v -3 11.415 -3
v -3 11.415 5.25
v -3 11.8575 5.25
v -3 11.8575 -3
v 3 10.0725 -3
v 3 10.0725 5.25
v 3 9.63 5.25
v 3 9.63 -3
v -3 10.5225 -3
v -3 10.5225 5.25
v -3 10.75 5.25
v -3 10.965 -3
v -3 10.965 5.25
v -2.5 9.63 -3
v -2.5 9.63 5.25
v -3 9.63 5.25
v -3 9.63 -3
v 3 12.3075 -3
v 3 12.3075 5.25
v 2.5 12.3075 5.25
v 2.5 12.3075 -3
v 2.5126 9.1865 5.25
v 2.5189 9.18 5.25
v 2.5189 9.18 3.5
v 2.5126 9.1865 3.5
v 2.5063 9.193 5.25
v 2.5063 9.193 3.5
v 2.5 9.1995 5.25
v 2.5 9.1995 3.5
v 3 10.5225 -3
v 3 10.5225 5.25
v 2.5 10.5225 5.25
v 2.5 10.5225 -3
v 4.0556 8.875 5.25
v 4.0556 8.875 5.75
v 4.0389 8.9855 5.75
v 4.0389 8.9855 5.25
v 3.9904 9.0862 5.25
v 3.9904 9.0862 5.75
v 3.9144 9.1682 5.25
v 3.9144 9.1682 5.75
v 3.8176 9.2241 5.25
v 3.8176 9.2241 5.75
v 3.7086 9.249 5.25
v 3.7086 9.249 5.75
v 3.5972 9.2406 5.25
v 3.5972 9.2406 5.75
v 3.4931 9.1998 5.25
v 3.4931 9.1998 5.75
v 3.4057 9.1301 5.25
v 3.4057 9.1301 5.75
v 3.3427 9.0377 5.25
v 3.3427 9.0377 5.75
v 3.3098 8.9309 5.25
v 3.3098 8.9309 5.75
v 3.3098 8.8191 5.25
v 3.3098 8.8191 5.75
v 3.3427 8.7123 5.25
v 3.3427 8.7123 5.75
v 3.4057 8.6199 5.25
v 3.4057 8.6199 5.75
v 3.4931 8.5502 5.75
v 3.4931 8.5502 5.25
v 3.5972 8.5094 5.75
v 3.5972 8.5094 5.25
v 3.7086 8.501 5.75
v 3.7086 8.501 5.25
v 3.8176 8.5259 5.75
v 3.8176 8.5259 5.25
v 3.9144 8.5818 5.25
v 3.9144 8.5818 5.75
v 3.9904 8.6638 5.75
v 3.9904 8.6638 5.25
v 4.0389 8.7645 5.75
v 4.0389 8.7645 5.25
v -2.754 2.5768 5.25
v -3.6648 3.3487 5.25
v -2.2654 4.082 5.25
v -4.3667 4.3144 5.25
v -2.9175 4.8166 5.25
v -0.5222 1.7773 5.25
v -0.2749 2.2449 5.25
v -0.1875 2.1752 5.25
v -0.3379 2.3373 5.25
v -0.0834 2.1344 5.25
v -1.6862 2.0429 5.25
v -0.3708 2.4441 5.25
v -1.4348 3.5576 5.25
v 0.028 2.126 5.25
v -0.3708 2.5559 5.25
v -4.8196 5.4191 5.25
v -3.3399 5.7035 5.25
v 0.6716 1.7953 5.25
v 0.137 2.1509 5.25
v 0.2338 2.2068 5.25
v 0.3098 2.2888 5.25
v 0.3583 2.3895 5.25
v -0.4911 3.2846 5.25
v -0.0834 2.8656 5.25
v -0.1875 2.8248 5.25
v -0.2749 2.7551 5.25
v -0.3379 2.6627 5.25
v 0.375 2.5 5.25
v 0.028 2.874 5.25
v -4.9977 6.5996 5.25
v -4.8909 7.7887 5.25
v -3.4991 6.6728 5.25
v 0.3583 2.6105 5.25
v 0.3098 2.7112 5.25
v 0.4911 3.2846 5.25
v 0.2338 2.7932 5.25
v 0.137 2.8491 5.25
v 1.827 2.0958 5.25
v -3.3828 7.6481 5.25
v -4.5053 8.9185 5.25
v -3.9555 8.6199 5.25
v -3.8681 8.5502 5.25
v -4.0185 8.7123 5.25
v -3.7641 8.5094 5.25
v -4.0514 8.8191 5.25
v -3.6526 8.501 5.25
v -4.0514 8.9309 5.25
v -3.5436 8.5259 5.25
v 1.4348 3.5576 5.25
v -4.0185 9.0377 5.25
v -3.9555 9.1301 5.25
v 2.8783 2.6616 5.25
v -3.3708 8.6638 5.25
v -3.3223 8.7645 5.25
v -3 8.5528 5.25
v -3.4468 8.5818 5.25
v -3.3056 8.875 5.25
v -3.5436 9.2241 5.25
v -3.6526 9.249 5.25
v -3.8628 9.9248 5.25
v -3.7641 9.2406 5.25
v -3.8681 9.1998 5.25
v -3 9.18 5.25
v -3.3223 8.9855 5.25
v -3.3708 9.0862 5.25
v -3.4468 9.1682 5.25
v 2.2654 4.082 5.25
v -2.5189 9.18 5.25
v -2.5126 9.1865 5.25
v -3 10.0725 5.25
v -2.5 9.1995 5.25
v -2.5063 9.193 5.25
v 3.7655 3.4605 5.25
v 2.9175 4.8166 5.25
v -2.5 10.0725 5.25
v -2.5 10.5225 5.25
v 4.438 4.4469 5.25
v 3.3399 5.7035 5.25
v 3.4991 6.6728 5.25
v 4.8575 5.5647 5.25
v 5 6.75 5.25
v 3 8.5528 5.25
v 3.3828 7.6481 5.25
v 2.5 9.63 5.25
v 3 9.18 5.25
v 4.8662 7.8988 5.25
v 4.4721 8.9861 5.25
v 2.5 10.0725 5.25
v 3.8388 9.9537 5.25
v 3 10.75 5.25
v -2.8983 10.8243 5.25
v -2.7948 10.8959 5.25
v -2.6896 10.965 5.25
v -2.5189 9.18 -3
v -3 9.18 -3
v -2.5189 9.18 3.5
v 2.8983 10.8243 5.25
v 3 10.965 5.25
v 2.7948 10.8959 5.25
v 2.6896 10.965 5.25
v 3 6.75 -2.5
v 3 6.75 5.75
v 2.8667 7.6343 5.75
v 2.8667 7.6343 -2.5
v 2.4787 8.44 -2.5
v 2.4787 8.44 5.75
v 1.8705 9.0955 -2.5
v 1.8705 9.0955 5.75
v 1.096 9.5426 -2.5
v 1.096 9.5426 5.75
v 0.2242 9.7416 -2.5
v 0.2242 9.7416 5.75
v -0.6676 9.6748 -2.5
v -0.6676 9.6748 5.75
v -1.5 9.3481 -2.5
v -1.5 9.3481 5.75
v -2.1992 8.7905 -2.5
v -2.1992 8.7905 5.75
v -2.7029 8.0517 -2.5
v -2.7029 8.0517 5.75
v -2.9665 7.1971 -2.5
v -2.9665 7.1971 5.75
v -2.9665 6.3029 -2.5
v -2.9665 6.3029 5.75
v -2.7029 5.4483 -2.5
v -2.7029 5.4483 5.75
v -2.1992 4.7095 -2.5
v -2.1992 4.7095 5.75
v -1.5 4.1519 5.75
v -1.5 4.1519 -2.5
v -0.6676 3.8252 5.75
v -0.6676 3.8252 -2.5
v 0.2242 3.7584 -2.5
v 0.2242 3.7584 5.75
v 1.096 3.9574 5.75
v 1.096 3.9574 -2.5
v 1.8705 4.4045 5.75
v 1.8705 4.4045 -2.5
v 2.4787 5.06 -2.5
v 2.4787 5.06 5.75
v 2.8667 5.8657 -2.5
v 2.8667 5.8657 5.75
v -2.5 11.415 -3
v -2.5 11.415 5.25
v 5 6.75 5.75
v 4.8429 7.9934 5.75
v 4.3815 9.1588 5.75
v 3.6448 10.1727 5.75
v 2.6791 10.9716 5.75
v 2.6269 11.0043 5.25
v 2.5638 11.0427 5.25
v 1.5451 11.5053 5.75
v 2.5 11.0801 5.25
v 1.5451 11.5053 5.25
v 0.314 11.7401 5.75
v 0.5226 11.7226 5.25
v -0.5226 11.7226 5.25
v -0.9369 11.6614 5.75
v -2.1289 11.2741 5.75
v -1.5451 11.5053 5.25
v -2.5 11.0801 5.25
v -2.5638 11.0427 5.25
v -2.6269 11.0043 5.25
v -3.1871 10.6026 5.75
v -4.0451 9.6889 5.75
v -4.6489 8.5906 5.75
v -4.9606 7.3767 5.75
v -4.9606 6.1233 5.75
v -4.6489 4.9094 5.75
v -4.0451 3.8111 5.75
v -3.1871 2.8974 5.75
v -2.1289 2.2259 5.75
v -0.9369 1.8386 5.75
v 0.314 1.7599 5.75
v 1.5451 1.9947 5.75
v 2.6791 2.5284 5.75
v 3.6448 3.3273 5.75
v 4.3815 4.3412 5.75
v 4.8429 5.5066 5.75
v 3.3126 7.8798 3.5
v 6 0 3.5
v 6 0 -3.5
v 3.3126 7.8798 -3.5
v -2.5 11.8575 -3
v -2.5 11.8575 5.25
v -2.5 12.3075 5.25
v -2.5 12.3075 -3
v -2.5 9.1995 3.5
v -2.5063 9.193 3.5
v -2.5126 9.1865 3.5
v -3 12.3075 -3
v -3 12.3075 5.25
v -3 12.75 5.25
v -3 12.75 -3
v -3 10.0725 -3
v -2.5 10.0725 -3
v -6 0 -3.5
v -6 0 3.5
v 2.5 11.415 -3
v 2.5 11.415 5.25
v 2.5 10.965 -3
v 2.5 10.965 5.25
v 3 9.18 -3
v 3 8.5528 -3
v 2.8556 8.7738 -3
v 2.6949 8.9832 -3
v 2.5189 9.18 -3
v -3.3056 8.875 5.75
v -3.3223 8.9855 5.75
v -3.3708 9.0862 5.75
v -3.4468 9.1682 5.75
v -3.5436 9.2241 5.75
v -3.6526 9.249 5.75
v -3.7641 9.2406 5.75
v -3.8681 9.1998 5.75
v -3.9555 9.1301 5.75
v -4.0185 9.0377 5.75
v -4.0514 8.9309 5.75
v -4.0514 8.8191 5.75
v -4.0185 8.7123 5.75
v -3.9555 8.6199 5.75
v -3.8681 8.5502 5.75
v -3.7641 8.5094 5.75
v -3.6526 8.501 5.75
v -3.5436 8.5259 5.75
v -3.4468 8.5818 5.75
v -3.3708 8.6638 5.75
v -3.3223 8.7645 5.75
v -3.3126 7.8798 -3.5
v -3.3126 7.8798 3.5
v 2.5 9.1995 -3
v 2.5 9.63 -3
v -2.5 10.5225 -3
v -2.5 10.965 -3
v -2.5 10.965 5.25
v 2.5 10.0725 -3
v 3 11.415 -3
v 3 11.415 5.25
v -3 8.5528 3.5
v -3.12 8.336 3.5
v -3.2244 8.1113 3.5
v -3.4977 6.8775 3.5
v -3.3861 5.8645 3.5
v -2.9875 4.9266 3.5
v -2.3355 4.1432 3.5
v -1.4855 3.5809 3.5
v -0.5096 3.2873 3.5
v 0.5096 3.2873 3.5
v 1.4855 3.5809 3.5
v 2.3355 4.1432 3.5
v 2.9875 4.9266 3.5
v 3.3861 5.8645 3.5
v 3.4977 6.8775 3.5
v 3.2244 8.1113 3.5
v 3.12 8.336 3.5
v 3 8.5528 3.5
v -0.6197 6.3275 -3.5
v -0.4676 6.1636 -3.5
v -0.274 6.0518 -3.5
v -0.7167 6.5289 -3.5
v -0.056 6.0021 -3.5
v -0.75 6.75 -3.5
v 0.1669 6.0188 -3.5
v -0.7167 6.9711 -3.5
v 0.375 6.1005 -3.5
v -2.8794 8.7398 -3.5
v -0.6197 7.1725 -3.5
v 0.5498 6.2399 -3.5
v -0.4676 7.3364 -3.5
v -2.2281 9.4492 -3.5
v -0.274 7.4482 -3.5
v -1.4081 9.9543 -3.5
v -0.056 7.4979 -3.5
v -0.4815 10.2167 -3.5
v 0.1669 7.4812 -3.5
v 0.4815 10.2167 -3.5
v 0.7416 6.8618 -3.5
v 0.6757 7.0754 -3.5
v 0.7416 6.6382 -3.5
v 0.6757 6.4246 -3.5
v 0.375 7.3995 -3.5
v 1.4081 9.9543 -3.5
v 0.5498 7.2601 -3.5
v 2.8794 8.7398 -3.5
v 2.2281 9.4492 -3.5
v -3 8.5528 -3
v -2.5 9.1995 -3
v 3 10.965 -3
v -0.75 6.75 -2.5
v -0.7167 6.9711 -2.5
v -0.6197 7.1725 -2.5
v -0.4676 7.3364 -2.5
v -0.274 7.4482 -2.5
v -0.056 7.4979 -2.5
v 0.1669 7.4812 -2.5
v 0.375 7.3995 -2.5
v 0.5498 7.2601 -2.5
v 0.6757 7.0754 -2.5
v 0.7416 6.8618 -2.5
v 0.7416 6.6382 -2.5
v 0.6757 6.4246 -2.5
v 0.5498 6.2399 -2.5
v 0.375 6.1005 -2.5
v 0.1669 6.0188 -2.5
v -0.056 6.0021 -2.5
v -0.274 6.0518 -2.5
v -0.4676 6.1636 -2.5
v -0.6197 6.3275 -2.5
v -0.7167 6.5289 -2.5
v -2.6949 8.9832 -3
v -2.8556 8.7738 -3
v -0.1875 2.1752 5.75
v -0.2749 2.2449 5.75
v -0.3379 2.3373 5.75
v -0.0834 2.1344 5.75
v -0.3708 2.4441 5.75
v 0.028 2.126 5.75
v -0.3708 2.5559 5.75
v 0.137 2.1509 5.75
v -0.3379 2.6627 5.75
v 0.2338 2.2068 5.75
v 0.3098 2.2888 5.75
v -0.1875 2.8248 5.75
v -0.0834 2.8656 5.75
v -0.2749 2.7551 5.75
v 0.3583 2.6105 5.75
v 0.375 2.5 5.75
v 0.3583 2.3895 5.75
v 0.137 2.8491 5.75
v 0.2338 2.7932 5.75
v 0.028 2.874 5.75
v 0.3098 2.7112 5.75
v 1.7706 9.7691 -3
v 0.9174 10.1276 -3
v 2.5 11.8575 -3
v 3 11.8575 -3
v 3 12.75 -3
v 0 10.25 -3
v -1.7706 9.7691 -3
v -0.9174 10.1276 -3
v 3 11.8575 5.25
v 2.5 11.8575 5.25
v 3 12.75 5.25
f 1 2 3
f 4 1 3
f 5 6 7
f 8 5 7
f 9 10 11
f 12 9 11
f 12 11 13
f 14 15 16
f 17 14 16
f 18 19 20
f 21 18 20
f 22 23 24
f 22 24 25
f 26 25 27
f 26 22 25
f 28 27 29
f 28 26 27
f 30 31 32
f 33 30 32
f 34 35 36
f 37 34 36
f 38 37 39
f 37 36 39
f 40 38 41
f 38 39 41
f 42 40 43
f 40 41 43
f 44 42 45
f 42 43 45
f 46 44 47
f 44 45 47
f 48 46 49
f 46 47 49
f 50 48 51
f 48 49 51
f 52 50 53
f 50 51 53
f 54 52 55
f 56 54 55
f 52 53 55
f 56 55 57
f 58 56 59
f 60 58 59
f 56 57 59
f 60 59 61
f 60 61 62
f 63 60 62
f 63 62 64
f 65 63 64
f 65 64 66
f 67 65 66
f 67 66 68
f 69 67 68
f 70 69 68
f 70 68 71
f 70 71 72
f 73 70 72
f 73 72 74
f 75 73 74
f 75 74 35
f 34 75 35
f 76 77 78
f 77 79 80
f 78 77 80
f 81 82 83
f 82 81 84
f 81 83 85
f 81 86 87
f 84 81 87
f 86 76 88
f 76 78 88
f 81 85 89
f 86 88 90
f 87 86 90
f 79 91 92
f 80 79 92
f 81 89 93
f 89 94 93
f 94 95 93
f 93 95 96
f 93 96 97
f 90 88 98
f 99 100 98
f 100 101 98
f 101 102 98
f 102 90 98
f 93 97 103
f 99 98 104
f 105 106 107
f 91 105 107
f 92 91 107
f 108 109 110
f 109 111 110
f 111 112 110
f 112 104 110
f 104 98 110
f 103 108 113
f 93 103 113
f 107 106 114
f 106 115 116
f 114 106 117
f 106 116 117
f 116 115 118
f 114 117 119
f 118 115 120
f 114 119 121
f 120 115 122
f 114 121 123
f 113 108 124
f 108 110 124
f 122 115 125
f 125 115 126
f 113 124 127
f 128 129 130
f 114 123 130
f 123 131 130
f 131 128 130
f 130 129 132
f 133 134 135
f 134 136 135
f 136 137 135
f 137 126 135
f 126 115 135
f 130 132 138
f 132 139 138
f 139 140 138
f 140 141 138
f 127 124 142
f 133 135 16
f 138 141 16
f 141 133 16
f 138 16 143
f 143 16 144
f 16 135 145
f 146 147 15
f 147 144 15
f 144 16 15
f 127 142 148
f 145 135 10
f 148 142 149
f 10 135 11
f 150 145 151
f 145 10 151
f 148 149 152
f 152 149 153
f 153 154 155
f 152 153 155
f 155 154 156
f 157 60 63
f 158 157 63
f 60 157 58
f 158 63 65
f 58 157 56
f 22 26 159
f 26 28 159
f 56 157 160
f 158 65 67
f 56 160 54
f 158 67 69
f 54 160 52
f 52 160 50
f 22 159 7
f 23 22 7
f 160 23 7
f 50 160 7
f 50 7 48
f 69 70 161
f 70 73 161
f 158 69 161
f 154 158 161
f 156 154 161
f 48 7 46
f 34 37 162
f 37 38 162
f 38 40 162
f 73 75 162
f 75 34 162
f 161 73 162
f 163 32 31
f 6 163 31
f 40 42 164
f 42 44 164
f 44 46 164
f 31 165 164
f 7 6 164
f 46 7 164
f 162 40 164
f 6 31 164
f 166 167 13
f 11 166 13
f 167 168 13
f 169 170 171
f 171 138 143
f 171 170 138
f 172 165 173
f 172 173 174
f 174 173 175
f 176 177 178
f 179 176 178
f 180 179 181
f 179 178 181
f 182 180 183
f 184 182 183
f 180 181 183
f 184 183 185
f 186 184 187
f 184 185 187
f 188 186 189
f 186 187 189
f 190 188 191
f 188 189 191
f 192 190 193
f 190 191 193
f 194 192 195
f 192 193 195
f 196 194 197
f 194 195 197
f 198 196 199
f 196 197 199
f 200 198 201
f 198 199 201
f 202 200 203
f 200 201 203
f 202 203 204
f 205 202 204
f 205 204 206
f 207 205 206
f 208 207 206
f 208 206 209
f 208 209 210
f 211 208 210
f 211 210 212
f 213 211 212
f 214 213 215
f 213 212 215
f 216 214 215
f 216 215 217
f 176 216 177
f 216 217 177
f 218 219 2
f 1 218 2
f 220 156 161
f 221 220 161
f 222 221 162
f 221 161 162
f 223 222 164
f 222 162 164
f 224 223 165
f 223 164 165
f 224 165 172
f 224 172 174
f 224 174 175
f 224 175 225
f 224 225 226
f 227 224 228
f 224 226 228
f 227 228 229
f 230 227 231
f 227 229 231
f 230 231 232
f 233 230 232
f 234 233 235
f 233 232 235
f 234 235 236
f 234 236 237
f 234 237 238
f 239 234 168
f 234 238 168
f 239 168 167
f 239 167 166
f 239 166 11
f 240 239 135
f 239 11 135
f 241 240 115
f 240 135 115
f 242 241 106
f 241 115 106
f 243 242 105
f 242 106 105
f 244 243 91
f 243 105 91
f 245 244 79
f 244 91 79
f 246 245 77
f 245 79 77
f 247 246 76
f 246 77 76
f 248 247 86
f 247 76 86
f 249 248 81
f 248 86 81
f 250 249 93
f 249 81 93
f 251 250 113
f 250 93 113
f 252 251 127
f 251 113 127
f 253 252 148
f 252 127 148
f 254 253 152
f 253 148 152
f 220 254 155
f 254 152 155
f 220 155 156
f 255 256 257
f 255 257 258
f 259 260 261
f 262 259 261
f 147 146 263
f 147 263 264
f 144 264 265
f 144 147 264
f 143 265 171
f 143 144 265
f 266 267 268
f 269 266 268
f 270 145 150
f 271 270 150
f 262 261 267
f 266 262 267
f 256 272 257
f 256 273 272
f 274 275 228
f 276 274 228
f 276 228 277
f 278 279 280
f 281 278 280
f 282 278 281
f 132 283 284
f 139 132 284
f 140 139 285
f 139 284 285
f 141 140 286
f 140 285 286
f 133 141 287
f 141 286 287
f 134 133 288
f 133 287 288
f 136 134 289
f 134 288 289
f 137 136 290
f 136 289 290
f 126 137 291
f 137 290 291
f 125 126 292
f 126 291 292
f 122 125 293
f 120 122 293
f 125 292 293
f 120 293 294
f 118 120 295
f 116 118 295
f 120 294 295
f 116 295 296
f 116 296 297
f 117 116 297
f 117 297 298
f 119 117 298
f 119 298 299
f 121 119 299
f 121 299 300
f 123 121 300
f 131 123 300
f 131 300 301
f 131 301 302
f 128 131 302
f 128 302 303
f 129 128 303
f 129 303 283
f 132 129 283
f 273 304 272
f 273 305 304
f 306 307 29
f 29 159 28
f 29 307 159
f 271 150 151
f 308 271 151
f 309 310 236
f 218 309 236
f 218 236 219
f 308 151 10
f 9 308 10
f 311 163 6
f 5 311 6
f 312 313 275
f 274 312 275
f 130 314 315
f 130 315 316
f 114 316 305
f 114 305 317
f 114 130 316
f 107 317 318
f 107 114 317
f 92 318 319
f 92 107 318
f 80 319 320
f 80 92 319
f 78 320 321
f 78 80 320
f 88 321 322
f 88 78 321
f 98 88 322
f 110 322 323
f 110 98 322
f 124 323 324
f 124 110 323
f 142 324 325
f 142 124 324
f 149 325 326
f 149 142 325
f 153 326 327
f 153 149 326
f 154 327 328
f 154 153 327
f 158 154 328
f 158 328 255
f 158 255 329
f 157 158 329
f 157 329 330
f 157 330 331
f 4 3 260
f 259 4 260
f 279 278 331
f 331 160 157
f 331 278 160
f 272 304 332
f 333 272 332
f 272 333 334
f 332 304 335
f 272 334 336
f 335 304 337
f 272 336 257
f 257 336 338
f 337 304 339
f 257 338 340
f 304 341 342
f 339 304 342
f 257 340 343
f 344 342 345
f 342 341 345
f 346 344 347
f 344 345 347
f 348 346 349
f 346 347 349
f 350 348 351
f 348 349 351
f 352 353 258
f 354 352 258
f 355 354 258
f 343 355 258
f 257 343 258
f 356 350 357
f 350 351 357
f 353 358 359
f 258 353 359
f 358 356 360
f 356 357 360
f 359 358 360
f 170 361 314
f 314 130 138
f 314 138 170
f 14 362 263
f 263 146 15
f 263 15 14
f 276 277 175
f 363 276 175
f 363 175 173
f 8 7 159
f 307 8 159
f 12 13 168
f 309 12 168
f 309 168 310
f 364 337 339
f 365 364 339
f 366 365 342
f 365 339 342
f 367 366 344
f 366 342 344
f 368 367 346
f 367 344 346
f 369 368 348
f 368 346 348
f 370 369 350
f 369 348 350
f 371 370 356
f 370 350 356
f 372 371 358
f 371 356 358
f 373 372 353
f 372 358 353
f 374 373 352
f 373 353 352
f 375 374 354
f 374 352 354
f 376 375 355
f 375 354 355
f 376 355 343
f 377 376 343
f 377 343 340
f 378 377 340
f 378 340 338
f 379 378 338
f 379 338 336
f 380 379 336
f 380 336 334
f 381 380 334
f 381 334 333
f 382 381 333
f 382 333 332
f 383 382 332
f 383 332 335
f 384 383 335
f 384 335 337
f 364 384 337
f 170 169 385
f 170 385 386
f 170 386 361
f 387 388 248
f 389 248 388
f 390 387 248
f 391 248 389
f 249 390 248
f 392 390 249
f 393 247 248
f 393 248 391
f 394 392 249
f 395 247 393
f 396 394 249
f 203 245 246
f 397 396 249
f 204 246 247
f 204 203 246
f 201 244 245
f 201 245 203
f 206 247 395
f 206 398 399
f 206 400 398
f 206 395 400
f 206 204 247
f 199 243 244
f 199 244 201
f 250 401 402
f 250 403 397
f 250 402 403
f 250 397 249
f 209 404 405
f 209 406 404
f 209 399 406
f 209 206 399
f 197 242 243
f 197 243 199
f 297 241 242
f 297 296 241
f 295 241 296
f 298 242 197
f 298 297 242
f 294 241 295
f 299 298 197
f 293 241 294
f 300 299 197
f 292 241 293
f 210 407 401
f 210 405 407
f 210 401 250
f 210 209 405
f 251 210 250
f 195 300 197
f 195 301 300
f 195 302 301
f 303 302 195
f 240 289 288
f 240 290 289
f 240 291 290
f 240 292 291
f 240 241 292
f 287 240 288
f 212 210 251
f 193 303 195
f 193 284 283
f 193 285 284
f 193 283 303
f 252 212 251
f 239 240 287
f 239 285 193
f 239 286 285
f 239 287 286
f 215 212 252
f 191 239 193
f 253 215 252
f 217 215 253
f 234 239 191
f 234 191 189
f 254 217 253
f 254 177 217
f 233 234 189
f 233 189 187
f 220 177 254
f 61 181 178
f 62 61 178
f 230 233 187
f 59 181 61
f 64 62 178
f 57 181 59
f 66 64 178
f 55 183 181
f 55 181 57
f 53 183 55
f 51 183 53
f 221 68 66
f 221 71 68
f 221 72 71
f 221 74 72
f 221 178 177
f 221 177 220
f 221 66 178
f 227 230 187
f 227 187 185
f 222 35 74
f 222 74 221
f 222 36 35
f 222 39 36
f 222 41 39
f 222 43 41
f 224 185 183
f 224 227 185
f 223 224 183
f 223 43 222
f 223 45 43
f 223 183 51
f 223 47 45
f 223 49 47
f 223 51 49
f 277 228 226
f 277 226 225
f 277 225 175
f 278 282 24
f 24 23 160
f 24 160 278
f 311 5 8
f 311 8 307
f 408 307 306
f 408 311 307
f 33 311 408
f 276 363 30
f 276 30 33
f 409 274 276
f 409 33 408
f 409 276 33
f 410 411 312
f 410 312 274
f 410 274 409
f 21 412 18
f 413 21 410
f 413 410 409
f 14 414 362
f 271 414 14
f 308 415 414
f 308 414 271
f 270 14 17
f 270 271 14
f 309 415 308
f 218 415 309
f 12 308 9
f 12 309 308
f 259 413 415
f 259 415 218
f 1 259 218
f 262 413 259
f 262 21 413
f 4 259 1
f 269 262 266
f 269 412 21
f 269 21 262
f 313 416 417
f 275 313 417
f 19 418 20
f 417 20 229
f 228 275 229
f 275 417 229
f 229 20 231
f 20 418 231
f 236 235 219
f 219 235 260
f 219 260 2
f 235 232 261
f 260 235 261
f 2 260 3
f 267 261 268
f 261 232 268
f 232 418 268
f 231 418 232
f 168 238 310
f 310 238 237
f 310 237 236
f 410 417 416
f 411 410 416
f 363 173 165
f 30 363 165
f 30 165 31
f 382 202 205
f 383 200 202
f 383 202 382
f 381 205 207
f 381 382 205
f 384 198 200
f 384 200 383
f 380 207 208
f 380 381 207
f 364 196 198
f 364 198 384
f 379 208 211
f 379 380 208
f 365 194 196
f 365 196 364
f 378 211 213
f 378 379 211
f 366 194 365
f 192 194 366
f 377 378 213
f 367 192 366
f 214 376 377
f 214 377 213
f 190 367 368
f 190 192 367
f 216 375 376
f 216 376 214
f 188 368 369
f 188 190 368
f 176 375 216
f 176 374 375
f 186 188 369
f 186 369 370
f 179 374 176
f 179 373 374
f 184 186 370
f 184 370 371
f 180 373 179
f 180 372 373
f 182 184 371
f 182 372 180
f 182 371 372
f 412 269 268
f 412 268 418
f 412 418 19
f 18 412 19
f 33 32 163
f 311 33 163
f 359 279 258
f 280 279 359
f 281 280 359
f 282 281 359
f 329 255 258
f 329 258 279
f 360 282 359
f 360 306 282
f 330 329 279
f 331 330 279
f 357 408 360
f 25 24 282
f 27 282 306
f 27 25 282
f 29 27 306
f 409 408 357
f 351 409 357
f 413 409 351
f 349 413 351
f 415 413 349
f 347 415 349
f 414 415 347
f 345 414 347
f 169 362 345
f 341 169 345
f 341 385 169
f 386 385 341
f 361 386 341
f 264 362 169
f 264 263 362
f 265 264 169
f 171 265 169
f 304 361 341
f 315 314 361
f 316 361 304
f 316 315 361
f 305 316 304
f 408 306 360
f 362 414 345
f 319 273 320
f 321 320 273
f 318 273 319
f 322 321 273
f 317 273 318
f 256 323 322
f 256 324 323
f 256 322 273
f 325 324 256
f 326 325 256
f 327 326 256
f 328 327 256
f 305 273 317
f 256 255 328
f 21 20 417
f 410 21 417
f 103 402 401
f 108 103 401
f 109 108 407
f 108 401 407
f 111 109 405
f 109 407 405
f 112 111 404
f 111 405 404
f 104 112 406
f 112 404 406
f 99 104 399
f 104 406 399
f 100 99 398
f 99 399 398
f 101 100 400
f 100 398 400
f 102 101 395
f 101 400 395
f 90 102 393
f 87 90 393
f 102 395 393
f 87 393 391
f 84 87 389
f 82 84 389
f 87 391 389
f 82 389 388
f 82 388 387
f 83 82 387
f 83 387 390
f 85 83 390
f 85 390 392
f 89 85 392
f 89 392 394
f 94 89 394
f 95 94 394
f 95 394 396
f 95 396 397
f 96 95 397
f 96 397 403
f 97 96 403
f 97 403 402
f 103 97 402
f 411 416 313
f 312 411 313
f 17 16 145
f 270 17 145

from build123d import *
from build123d.topology import SkipClean

# Parameters (mm, degrees)
BOSS_EXTRUDE1_DEPTH = 3.5
BOSS_EXTRUDE2_START = 1.75
SKETCH3_R           = 3.5
BOSS_EXTRUDE2_DEPTH = 1.75
BOSS_EXTRUDE3_START = 1.75
SKETCH3_3_R         = 5
BOSS_EXTRUDE3_DEPTH = 0.5
SKETCH4_R           = 3
CUT_EXTRUDE2_DEPTH  = 8.25
SKETCH5_R           = 0.75
CUT_EXTRUDE3_DEPTH  = 8.25
BOSS_EXTRUDE4_DEPTH = 8.25
CUT_EXTRUDE4_REACH  = 18.856
SKETCH7_R           = 0.375


with BuildPart() as part:
    # Sketch1 → Boss-Extrude1 (new, symmetric)
    with BuildSketch(Plane.XY):
        with BuildLine():
            Line((-6, 0), (6, 0))
            Line((6, 0), (3.312648335, 7.879761483))
            ThreePointArc((3.312648335, 7.879761483), (0, 10.25), (-3.312648335, 7.879761483))
            Line((-3.312648335, 7.879761483), (-6, 0))
        make_face()
    extrude(amount=BOSS_EXTRUDE1_DEPTH, both=True)

    # Sketch3 → Boss-Extrude2 (add)
    with SkipClean():  # the faces are left unmerged after this step: merging them gives an invalid solid
        with BuildSketch(Plane.XY.offset(3.5).offset(BOSS_EXTRUDE2_START)):
            with Locations(Location((0, 6.75, 0), (0, 0, 161.168324383))):
                Circle(SKETCH3_R)
        extrude(amount=-BOSS_EXTRUDE2_DEPTH)

    # Sketch3<3> → Boss-Extrude3 (add)
    with BuildSketch(Plane.XY.offset(3.5).offset(BOSS_EXTRUDE3_START)):
        with Locations((0, 6.75)):
            Circle(SKETCH3_3_R)
    extrude(amount=BOSS_EXTRUDE3_DEPTH)

    # Sketch4 → Cut-Extrude2 (cut)
    with SkipClean():  # the faces are left unmerged after this step: merging them gives an invalid solid
        with BuildSketch(Plane.XY.offset(5.75)):
            with Locations((0, 6.75)):
                Circle(SKETCH4_R)
        extrude(amount=-CUT_EXTRUDE2_DEPTH, mode=Mode.SUBTRACT)

    # Sketch5 → Cut-Extrude3 (cut)
    with SkipClean():  # the faces are left unmerged after this step: merging them gives an invalid solid
        with BuildSketch(Plane(origin=(0, 0, -3.5), x_dir=(-1, 0, 0), z_dir=(0, 0, -1))):
            with Locations((0, 6.75)):
                Circle(SKETCH5_R)
        extrude(amount=-CUT_EXTRUDE3_DEPTH, mode=Mode.SUBTRACT)

    # Sketch6 → Boss-Extrude4 (add)
    with SkipClean():  # the faces are left unmerged after this step: merging them gives an invalid solid
        with BuildSketch(Plane(origin=(0, 0, 5.25), x_dir=(-1, 0, 0), z_dir=(0, 0, -1))):
            with BuildLine():
                Line((3, 12.75), (-3, 12.75))
                Line((-3, 12.75), (-3, 12.3075))
                Line((-3, 12.3075), (-2.5, 12.3075))
                Line((-2.5, 12.3075), (-2.5, 11.8575))
                Line((-2.5, 11.8575), (-3, 11.8575))
                Line((-3, 11.8575), (-3, 11.415))
                Line((-3, 11.415), (-2.5, 11.415))
                Line((-2.5, 11.415), (-2.5, 10.965))
                Line((-2.5, 10.965), (-3, 10.965))
                Line((-3, 10.965), (-3, 10.5225))
                Line((-3, 10.5225), (-2.5, 10.5225))
                Line((-2.5, 10.5225), (-2.5, 10.0725))
                Line((-2.5, 10.0725), (-3, 10.0725))
                Line((-3, 10.0725), (-3, 9.63))
                Line((-3, 9.63), (-2.5, 9.63))
                Line((-2.5, 9.63), (-2.5, 9.199489743))
                ThreePointArc((-2.5, 9.199489743), (0, 10.25), (2.5, 9.199489743))
                Line((2.5, 9.199489743), (2.5, 9.63))
                Line((2.5, 9.63), (3, 9.63))
                Line((3, 9.63), (3, 10.0725))
                Line((3, 10.0725), (2.5, 10.0725))
                Line((2.5, 10.0725), (2.5, 10.5225))
                Line((2.5, 10.5225), (3, 10.5225))
                Line((3, 10.5225), (3, 10.965))
                Line((3, 10.965), (2.5, 10.965))
                Line((2.5, 10.965), (2.5, 11.415))
                Line((2.5, 11.415), (3, 11.415))
                Line((3, 11.415), (3, 11.8575))
                Line((3, 11.8575), (2.5, 11.8575))
                Line((2.5, 11.8575), (2.5, 12.3075))
                Line((2.5, 12.3075), (3, 12.3075))
                Line((3, 12.3075), (3, 12.75))
            make_face()
            with BuildLine():
                Line((3, 9.18), (2.518948193, 9.18))
                ThreePointArc((2.518948193, 9.18), (2.777237817, 8.880011763), (3, 8.552775638))
                Line((3, 8.552775638), (3, 9.18))
            make_face()
            with BuildLine():
                ThreePointArc((-3, 8.552775638), (-2.777237817, 8.880011763), (-2.518948193, 9.18))
                Line((-2.518948193, 9.18), (-3, 9.18))
                Line((-3, 9.18), (-3, 8.552775638))
            make_face()
        extrude(amount=BOSS_EXTRUDE4_DEPTH)

    # Sketch7 → Cut-Extrude4 (cut, up to next)
    with BuildSketch(Plane.XY.offset(5.75), mode=Mode.PRIVATE) as cut_extrude4_sk1:
        with Locations((0, 2.5)):
            Circle(SKETCH7_R)
    cut_extrude4_tool1 = extrude(cut_extrude4_sk1.sketch, amount=-CUT_EXTRUDE4_REACH, mode=Mode.PRIVATE) & part.part
    # Sketch7 → Cut-Extrude4 (cut, up to next)
    with BuildSketch(Plane.XY.offset(5.75), mode=Mode.PRIVATE) as cut_extrude4_sk2:
        with Locations((3.680607966, 8.875)):
            Circle(SKETCH7_R)
    cut_extrude4_tool2 = extrude(cut_extrude4_sk2.sketch, amount=-CUT_EXTRUDE4_REACH, mode=Mode.PRIVATE) & part.part
    # Sketch7 → Cut-Extrude4 (cut, up to next)
    with BuildSketch(Plane.XY.offset(5.75), mode=Mode.PRIVATE) as cut_extrude4_sk3:
        with Locations((-3.680607966, 8.875)):
            Circle(SKETCH7_R)
    cut_extrude4_tool3 = extrude(cut_extrude4_sk3.sketch, amount=-CUT_EXTRUDE4_REACH, mode=Mode.PRIVATE) & part.part
    add(cut_extrude4_tool1.solids().sort_by_distance((0, 2.5, 5.75))[0], mode=Mode.SUBTRACT)
    add(cut_extrude4_tool2.solids().sort_by_distance((3.680608, 8.875, 5.75))[0], mode=Mode.SUBTRACT)
    add(cut_extrude4_tool3.solids().sort_by_distance((-3.680608, 8.875, 5.75))[0], mode=Mode.SUBTRACT)


solid = part.part
